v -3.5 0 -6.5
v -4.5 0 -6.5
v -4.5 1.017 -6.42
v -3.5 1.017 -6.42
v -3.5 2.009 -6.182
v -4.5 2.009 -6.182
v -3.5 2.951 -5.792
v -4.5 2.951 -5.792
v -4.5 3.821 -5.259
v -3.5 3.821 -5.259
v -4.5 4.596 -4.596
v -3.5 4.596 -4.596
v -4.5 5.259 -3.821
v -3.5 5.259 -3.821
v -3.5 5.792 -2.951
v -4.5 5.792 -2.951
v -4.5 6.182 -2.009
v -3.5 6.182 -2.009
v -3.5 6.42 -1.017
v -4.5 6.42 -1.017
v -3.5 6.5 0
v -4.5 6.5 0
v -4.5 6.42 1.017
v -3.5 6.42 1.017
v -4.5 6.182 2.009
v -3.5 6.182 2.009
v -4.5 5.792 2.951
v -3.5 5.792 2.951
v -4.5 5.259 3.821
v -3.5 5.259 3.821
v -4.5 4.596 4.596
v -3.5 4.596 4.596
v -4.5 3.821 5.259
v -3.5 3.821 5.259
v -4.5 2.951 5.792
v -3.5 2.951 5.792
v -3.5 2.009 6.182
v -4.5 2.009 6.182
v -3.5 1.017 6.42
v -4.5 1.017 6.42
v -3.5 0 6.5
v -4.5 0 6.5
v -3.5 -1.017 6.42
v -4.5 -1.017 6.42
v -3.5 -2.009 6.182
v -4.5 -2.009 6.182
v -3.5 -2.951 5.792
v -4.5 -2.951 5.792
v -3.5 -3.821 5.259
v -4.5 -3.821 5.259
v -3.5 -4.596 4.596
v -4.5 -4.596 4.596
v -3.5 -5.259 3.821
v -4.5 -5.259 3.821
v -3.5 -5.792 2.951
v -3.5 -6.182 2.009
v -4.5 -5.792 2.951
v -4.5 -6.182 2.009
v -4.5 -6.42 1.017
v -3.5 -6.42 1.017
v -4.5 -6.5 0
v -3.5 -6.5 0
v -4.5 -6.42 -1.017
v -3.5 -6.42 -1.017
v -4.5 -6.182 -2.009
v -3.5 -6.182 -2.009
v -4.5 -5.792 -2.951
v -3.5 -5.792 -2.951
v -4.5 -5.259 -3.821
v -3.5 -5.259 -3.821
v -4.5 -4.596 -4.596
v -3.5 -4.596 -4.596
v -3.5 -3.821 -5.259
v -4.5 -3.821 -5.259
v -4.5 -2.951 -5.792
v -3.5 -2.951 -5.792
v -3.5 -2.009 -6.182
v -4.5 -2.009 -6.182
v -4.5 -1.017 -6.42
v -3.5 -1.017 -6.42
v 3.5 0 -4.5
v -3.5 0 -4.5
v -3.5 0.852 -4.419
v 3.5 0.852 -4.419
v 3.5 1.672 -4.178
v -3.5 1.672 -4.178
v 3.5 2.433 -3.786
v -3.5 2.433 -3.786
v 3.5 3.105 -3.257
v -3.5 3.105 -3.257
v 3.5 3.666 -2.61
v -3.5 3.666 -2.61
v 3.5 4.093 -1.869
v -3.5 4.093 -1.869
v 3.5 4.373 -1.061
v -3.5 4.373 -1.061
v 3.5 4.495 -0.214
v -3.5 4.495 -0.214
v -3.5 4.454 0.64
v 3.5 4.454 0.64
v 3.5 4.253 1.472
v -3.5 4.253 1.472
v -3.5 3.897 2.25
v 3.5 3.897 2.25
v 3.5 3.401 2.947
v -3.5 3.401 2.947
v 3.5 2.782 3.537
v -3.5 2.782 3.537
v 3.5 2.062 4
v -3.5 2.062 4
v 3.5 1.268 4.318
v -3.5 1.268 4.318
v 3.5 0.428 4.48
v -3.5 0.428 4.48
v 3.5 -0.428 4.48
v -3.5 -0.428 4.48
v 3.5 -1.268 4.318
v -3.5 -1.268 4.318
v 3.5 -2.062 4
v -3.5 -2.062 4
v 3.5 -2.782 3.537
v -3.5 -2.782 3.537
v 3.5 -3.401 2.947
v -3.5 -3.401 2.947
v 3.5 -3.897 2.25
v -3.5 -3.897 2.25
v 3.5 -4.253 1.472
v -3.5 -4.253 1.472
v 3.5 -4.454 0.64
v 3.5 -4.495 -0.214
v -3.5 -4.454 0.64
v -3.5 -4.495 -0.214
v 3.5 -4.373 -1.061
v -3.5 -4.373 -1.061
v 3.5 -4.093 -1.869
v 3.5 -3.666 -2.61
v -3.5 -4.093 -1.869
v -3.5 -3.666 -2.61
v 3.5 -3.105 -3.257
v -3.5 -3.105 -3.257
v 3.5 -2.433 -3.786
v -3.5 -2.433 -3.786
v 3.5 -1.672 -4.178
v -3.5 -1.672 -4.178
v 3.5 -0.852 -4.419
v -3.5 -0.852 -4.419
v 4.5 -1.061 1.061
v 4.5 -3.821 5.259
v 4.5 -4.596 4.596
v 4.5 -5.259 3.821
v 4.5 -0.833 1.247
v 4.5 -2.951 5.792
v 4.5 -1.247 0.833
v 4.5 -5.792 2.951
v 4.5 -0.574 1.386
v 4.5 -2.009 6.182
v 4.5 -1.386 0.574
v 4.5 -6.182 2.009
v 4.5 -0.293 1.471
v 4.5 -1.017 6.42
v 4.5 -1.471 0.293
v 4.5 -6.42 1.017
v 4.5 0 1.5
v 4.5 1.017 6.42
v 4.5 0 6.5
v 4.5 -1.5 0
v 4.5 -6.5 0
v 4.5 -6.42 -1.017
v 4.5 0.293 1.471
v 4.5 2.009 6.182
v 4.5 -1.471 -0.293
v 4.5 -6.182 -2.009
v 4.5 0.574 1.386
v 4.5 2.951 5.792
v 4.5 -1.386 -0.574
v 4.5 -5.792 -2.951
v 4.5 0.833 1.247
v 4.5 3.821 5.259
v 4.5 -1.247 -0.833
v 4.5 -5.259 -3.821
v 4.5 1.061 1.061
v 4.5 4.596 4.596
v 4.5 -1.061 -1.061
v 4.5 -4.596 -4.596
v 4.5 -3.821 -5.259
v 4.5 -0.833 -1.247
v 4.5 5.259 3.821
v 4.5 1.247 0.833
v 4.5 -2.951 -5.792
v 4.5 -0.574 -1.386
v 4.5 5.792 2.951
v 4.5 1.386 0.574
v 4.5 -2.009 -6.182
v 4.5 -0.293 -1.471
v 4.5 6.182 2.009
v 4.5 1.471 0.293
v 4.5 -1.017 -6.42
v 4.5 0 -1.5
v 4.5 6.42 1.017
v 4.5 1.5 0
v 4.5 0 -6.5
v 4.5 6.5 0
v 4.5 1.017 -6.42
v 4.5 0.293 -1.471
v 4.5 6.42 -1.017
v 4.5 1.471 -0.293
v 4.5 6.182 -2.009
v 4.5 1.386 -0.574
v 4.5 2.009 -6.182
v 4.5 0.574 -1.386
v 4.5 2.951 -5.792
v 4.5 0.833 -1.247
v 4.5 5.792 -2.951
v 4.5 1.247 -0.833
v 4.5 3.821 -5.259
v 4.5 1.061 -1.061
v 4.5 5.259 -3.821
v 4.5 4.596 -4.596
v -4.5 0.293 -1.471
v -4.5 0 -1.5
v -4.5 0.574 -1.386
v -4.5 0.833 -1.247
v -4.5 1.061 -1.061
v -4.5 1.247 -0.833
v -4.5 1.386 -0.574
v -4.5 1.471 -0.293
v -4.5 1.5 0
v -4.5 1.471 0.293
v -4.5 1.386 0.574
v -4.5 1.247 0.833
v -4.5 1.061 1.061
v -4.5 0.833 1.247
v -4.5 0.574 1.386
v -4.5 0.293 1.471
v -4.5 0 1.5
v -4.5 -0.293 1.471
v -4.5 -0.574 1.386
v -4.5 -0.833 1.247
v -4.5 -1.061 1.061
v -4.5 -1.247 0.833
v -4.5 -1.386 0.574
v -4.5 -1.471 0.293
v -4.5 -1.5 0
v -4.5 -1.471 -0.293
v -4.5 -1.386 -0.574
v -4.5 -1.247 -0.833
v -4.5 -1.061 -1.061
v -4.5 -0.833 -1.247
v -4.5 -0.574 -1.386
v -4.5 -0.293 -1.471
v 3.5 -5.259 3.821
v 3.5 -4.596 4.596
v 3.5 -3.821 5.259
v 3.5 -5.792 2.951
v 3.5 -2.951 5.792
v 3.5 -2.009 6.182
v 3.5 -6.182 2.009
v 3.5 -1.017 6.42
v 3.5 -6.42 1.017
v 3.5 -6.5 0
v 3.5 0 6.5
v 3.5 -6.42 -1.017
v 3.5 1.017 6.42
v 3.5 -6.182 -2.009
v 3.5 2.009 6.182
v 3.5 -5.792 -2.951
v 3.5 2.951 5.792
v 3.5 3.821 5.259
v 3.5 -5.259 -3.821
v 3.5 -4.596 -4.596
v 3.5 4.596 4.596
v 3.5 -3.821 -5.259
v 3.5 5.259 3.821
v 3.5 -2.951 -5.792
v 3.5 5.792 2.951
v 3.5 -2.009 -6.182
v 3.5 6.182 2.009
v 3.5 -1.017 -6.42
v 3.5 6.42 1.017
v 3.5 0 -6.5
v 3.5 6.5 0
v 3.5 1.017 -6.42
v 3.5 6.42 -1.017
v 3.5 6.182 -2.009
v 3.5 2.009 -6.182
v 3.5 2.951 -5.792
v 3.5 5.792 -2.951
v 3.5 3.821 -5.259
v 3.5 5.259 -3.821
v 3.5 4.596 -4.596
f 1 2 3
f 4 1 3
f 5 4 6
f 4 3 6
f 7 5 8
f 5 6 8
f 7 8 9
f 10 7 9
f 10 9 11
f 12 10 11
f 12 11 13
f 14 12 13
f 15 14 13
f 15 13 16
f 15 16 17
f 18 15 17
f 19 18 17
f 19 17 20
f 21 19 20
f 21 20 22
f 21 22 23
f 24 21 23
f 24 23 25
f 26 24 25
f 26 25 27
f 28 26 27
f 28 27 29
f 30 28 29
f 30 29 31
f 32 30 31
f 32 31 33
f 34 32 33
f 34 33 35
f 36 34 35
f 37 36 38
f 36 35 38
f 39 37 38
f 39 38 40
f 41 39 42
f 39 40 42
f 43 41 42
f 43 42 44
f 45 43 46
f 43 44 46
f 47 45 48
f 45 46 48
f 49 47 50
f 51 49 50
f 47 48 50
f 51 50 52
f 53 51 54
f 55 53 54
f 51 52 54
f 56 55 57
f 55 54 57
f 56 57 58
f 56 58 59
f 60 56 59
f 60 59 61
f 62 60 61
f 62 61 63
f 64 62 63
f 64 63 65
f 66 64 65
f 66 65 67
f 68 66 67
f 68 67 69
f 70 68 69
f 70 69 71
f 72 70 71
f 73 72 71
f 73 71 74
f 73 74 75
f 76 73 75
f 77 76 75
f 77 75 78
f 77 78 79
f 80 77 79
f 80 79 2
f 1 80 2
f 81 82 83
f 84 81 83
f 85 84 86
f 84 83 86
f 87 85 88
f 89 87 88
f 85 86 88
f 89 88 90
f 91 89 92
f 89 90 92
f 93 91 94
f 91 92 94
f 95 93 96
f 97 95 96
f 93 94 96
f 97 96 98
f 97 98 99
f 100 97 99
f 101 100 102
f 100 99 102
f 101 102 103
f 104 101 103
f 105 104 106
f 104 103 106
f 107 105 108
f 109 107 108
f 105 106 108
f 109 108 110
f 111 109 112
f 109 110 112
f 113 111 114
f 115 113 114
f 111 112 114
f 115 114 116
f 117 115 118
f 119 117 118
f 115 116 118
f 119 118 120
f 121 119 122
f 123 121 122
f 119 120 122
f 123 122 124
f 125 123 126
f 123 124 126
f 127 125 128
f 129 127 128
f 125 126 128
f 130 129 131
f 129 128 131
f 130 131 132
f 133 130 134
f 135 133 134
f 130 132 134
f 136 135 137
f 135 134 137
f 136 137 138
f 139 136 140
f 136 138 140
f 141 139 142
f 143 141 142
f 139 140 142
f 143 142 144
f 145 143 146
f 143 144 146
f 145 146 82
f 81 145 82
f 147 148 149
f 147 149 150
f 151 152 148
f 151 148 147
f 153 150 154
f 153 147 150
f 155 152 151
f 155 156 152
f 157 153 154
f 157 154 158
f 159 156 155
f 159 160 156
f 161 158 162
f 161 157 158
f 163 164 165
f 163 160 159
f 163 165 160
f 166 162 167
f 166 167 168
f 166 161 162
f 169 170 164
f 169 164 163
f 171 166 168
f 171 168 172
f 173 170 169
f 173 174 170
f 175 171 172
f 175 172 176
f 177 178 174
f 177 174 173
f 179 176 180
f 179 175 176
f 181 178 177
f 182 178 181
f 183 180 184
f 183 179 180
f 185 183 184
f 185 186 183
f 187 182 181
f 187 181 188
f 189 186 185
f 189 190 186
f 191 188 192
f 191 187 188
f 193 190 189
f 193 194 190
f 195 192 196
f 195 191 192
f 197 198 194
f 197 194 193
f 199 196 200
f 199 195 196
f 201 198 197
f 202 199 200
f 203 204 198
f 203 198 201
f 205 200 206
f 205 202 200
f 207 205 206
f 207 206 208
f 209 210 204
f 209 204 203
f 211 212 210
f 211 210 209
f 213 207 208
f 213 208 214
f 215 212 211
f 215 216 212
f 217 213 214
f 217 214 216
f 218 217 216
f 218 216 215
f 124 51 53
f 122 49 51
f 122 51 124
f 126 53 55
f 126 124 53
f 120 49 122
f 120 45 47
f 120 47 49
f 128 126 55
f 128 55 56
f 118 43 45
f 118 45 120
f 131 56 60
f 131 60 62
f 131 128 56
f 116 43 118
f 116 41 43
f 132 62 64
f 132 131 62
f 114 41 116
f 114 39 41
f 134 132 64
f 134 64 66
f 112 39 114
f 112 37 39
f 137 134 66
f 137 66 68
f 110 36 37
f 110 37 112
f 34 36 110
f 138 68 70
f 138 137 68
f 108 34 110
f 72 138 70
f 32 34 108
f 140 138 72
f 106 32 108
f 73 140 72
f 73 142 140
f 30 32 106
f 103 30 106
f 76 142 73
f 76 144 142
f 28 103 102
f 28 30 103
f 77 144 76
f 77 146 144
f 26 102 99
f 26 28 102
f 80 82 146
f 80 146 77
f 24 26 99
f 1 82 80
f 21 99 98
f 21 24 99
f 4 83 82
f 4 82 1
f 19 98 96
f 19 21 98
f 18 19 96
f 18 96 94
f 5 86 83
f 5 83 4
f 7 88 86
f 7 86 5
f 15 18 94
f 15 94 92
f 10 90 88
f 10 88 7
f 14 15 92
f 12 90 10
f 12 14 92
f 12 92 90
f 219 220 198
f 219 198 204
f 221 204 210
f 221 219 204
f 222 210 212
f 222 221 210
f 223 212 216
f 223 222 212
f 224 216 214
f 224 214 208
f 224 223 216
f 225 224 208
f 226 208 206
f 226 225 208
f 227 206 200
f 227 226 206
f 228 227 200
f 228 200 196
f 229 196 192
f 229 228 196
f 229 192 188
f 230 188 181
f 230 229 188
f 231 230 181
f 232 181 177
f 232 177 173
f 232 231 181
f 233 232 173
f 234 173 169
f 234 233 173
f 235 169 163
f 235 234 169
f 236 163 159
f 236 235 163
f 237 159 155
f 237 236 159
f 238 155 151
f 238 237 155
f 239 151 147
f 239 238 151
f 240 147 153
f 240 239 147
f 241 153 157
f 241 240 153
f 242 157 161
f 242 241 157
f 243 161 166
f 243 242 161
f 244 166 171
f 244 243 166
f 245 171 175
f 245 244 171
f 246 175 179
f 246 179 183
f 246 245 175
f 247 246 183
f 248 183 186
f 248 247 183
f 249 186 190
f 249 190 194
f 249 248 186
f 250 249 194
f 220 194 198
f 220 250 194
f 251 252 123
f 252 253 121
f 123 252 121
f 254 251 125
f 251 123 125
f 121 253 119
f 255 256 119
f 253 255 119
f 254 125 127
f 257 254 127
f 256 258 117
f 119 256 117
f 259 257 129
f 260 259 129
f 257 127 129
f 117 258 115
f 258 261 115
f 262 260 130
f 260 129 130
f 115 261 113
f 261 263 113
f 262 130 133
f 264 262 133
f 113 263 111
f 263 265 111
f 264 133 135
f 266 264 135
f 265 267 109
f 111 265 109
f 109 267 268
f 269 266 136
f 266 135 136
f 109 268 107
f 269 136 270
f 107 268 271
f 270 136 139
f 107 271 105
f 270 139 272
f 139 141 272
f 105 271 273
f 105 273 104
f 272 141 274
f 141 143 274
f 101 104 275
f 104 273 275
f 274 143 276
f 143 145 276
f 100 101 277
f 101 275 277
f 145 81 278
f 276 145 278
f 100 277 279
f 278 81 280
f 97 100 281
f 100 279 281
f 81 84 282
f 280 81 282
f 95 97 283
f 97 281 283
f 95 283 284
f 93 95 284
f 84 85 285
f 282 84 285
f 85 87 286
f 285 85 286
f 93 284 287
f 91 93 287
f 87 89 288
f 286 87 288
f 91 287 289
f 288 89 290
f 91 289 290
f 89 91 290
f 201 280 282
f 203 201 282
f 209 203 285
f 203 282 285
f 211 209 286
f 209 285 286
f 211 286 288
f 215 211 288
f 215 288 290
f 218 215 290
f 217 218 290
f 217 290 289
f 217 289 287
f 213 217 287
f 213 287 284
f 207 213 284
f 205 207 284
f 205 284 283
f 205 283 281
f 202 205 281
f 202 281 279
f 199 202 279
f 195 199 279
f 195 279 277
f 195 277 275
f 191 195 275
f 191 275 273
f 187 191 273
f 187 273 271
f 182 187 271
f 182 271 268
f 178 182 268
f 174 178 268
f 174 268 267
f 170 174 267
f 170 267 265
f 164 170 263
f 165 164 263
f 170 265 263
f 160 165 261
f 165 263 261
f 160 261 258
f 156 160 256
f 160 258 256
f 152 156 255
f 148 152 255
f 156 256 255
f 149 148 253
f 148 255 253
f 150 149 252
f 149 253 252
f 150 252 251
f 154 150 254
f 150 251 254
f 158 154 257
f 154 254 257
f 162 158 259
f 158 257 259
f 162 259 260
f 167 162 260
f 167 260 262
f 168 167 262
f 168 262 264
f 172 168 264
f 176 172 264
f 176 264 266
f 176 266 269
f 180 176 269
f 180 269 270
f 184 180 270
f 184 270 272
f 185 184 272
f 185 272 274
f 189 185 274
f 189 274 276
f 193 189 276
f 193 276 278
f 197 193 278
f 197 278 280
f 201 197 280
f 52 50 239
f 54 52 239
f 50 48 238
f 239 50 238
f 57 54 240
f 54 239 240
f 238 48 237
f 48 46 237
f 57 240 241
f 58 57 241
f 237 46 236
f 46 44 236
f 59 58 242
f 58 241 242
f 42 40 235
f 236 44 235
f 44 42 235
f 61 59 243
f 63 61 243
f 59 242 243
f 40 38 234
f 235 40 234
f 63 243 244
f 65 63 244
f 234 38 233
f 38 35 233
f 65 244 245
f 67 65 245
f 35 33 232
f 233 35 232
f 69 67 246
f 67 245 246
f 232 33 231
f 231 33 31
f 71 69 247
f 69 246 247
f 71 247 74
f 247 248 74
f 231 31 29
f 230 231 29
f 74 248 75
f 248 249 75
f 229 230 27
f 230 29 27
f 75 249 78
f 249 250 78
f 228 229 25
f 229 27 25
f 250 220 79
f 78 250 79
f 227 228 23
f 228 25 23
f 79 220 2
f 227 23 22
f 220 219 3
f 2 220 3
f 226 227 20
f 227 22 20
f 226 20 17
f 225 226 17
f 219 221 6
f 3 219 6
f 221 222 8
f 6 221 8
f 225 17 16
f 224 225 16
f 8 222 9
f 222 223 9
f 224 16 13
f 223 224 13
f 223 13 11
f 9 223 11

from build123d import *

# Parameters (mm, degrees)
BOSS_EXTRUDE1_DEPTH      = 4.5
BOSS_EXTRUDE1_DEPTH_BACK = 4.5
SKETCH1_R                = 6.5
SKETCH1_R_2              = 1.5
CUT_EXTRUDE1_DEPTH       = 3.5
CUT_EXTRUDE1_DEPTH_BACK  = 3.5
SKETCH1_3_R              = 6.5
SKETCH1_3_R_2            = 4.5


with BuildPart() as part:
    # Sketch1 → Boss-Extrude1 (new, two sides: drawn at the far end of the back side and taken through both)
    with BuildSketch(Plane(origin=(0, 0, 0), x_dir=(0, 0, -1), z_dir=(1, 0, 0)).offset(-BOSS_EXTRUDE1_DEPTH_BACK)):
        Circle(SKETCH1_R)
        Circle(SKETCH1_R_2, mode=Mode.SUBTRACT)
    extrude(amount=BOSS_EXTRUDE1_DEPTH + BOSS_EXTRUDE1_DEPTH_BACK)

    # Sketch1<3> → Cut-Extrude1 (cut, two sides: drawn at the far end of the back side and taken through both)
    with BuildSketch(Plane(origin=(0, 0, 0), x_dir=(0, 0, -1), z_dir=(1, 0, 0)).offset(-CUT_EXTRUDE1_DEPTH_BACK)):
        Circle(SKETCH1_3_R)
        Circle(SKETCH1_3_R_2, mode=Mode.SUBTRACT)
    extrude(amount=CUT_EXTRUDE1_DEPTH + CUT_EXTRUDE1_DEPTH_BACK, mode=Mode.SUBTRACT)


solid = part.part
